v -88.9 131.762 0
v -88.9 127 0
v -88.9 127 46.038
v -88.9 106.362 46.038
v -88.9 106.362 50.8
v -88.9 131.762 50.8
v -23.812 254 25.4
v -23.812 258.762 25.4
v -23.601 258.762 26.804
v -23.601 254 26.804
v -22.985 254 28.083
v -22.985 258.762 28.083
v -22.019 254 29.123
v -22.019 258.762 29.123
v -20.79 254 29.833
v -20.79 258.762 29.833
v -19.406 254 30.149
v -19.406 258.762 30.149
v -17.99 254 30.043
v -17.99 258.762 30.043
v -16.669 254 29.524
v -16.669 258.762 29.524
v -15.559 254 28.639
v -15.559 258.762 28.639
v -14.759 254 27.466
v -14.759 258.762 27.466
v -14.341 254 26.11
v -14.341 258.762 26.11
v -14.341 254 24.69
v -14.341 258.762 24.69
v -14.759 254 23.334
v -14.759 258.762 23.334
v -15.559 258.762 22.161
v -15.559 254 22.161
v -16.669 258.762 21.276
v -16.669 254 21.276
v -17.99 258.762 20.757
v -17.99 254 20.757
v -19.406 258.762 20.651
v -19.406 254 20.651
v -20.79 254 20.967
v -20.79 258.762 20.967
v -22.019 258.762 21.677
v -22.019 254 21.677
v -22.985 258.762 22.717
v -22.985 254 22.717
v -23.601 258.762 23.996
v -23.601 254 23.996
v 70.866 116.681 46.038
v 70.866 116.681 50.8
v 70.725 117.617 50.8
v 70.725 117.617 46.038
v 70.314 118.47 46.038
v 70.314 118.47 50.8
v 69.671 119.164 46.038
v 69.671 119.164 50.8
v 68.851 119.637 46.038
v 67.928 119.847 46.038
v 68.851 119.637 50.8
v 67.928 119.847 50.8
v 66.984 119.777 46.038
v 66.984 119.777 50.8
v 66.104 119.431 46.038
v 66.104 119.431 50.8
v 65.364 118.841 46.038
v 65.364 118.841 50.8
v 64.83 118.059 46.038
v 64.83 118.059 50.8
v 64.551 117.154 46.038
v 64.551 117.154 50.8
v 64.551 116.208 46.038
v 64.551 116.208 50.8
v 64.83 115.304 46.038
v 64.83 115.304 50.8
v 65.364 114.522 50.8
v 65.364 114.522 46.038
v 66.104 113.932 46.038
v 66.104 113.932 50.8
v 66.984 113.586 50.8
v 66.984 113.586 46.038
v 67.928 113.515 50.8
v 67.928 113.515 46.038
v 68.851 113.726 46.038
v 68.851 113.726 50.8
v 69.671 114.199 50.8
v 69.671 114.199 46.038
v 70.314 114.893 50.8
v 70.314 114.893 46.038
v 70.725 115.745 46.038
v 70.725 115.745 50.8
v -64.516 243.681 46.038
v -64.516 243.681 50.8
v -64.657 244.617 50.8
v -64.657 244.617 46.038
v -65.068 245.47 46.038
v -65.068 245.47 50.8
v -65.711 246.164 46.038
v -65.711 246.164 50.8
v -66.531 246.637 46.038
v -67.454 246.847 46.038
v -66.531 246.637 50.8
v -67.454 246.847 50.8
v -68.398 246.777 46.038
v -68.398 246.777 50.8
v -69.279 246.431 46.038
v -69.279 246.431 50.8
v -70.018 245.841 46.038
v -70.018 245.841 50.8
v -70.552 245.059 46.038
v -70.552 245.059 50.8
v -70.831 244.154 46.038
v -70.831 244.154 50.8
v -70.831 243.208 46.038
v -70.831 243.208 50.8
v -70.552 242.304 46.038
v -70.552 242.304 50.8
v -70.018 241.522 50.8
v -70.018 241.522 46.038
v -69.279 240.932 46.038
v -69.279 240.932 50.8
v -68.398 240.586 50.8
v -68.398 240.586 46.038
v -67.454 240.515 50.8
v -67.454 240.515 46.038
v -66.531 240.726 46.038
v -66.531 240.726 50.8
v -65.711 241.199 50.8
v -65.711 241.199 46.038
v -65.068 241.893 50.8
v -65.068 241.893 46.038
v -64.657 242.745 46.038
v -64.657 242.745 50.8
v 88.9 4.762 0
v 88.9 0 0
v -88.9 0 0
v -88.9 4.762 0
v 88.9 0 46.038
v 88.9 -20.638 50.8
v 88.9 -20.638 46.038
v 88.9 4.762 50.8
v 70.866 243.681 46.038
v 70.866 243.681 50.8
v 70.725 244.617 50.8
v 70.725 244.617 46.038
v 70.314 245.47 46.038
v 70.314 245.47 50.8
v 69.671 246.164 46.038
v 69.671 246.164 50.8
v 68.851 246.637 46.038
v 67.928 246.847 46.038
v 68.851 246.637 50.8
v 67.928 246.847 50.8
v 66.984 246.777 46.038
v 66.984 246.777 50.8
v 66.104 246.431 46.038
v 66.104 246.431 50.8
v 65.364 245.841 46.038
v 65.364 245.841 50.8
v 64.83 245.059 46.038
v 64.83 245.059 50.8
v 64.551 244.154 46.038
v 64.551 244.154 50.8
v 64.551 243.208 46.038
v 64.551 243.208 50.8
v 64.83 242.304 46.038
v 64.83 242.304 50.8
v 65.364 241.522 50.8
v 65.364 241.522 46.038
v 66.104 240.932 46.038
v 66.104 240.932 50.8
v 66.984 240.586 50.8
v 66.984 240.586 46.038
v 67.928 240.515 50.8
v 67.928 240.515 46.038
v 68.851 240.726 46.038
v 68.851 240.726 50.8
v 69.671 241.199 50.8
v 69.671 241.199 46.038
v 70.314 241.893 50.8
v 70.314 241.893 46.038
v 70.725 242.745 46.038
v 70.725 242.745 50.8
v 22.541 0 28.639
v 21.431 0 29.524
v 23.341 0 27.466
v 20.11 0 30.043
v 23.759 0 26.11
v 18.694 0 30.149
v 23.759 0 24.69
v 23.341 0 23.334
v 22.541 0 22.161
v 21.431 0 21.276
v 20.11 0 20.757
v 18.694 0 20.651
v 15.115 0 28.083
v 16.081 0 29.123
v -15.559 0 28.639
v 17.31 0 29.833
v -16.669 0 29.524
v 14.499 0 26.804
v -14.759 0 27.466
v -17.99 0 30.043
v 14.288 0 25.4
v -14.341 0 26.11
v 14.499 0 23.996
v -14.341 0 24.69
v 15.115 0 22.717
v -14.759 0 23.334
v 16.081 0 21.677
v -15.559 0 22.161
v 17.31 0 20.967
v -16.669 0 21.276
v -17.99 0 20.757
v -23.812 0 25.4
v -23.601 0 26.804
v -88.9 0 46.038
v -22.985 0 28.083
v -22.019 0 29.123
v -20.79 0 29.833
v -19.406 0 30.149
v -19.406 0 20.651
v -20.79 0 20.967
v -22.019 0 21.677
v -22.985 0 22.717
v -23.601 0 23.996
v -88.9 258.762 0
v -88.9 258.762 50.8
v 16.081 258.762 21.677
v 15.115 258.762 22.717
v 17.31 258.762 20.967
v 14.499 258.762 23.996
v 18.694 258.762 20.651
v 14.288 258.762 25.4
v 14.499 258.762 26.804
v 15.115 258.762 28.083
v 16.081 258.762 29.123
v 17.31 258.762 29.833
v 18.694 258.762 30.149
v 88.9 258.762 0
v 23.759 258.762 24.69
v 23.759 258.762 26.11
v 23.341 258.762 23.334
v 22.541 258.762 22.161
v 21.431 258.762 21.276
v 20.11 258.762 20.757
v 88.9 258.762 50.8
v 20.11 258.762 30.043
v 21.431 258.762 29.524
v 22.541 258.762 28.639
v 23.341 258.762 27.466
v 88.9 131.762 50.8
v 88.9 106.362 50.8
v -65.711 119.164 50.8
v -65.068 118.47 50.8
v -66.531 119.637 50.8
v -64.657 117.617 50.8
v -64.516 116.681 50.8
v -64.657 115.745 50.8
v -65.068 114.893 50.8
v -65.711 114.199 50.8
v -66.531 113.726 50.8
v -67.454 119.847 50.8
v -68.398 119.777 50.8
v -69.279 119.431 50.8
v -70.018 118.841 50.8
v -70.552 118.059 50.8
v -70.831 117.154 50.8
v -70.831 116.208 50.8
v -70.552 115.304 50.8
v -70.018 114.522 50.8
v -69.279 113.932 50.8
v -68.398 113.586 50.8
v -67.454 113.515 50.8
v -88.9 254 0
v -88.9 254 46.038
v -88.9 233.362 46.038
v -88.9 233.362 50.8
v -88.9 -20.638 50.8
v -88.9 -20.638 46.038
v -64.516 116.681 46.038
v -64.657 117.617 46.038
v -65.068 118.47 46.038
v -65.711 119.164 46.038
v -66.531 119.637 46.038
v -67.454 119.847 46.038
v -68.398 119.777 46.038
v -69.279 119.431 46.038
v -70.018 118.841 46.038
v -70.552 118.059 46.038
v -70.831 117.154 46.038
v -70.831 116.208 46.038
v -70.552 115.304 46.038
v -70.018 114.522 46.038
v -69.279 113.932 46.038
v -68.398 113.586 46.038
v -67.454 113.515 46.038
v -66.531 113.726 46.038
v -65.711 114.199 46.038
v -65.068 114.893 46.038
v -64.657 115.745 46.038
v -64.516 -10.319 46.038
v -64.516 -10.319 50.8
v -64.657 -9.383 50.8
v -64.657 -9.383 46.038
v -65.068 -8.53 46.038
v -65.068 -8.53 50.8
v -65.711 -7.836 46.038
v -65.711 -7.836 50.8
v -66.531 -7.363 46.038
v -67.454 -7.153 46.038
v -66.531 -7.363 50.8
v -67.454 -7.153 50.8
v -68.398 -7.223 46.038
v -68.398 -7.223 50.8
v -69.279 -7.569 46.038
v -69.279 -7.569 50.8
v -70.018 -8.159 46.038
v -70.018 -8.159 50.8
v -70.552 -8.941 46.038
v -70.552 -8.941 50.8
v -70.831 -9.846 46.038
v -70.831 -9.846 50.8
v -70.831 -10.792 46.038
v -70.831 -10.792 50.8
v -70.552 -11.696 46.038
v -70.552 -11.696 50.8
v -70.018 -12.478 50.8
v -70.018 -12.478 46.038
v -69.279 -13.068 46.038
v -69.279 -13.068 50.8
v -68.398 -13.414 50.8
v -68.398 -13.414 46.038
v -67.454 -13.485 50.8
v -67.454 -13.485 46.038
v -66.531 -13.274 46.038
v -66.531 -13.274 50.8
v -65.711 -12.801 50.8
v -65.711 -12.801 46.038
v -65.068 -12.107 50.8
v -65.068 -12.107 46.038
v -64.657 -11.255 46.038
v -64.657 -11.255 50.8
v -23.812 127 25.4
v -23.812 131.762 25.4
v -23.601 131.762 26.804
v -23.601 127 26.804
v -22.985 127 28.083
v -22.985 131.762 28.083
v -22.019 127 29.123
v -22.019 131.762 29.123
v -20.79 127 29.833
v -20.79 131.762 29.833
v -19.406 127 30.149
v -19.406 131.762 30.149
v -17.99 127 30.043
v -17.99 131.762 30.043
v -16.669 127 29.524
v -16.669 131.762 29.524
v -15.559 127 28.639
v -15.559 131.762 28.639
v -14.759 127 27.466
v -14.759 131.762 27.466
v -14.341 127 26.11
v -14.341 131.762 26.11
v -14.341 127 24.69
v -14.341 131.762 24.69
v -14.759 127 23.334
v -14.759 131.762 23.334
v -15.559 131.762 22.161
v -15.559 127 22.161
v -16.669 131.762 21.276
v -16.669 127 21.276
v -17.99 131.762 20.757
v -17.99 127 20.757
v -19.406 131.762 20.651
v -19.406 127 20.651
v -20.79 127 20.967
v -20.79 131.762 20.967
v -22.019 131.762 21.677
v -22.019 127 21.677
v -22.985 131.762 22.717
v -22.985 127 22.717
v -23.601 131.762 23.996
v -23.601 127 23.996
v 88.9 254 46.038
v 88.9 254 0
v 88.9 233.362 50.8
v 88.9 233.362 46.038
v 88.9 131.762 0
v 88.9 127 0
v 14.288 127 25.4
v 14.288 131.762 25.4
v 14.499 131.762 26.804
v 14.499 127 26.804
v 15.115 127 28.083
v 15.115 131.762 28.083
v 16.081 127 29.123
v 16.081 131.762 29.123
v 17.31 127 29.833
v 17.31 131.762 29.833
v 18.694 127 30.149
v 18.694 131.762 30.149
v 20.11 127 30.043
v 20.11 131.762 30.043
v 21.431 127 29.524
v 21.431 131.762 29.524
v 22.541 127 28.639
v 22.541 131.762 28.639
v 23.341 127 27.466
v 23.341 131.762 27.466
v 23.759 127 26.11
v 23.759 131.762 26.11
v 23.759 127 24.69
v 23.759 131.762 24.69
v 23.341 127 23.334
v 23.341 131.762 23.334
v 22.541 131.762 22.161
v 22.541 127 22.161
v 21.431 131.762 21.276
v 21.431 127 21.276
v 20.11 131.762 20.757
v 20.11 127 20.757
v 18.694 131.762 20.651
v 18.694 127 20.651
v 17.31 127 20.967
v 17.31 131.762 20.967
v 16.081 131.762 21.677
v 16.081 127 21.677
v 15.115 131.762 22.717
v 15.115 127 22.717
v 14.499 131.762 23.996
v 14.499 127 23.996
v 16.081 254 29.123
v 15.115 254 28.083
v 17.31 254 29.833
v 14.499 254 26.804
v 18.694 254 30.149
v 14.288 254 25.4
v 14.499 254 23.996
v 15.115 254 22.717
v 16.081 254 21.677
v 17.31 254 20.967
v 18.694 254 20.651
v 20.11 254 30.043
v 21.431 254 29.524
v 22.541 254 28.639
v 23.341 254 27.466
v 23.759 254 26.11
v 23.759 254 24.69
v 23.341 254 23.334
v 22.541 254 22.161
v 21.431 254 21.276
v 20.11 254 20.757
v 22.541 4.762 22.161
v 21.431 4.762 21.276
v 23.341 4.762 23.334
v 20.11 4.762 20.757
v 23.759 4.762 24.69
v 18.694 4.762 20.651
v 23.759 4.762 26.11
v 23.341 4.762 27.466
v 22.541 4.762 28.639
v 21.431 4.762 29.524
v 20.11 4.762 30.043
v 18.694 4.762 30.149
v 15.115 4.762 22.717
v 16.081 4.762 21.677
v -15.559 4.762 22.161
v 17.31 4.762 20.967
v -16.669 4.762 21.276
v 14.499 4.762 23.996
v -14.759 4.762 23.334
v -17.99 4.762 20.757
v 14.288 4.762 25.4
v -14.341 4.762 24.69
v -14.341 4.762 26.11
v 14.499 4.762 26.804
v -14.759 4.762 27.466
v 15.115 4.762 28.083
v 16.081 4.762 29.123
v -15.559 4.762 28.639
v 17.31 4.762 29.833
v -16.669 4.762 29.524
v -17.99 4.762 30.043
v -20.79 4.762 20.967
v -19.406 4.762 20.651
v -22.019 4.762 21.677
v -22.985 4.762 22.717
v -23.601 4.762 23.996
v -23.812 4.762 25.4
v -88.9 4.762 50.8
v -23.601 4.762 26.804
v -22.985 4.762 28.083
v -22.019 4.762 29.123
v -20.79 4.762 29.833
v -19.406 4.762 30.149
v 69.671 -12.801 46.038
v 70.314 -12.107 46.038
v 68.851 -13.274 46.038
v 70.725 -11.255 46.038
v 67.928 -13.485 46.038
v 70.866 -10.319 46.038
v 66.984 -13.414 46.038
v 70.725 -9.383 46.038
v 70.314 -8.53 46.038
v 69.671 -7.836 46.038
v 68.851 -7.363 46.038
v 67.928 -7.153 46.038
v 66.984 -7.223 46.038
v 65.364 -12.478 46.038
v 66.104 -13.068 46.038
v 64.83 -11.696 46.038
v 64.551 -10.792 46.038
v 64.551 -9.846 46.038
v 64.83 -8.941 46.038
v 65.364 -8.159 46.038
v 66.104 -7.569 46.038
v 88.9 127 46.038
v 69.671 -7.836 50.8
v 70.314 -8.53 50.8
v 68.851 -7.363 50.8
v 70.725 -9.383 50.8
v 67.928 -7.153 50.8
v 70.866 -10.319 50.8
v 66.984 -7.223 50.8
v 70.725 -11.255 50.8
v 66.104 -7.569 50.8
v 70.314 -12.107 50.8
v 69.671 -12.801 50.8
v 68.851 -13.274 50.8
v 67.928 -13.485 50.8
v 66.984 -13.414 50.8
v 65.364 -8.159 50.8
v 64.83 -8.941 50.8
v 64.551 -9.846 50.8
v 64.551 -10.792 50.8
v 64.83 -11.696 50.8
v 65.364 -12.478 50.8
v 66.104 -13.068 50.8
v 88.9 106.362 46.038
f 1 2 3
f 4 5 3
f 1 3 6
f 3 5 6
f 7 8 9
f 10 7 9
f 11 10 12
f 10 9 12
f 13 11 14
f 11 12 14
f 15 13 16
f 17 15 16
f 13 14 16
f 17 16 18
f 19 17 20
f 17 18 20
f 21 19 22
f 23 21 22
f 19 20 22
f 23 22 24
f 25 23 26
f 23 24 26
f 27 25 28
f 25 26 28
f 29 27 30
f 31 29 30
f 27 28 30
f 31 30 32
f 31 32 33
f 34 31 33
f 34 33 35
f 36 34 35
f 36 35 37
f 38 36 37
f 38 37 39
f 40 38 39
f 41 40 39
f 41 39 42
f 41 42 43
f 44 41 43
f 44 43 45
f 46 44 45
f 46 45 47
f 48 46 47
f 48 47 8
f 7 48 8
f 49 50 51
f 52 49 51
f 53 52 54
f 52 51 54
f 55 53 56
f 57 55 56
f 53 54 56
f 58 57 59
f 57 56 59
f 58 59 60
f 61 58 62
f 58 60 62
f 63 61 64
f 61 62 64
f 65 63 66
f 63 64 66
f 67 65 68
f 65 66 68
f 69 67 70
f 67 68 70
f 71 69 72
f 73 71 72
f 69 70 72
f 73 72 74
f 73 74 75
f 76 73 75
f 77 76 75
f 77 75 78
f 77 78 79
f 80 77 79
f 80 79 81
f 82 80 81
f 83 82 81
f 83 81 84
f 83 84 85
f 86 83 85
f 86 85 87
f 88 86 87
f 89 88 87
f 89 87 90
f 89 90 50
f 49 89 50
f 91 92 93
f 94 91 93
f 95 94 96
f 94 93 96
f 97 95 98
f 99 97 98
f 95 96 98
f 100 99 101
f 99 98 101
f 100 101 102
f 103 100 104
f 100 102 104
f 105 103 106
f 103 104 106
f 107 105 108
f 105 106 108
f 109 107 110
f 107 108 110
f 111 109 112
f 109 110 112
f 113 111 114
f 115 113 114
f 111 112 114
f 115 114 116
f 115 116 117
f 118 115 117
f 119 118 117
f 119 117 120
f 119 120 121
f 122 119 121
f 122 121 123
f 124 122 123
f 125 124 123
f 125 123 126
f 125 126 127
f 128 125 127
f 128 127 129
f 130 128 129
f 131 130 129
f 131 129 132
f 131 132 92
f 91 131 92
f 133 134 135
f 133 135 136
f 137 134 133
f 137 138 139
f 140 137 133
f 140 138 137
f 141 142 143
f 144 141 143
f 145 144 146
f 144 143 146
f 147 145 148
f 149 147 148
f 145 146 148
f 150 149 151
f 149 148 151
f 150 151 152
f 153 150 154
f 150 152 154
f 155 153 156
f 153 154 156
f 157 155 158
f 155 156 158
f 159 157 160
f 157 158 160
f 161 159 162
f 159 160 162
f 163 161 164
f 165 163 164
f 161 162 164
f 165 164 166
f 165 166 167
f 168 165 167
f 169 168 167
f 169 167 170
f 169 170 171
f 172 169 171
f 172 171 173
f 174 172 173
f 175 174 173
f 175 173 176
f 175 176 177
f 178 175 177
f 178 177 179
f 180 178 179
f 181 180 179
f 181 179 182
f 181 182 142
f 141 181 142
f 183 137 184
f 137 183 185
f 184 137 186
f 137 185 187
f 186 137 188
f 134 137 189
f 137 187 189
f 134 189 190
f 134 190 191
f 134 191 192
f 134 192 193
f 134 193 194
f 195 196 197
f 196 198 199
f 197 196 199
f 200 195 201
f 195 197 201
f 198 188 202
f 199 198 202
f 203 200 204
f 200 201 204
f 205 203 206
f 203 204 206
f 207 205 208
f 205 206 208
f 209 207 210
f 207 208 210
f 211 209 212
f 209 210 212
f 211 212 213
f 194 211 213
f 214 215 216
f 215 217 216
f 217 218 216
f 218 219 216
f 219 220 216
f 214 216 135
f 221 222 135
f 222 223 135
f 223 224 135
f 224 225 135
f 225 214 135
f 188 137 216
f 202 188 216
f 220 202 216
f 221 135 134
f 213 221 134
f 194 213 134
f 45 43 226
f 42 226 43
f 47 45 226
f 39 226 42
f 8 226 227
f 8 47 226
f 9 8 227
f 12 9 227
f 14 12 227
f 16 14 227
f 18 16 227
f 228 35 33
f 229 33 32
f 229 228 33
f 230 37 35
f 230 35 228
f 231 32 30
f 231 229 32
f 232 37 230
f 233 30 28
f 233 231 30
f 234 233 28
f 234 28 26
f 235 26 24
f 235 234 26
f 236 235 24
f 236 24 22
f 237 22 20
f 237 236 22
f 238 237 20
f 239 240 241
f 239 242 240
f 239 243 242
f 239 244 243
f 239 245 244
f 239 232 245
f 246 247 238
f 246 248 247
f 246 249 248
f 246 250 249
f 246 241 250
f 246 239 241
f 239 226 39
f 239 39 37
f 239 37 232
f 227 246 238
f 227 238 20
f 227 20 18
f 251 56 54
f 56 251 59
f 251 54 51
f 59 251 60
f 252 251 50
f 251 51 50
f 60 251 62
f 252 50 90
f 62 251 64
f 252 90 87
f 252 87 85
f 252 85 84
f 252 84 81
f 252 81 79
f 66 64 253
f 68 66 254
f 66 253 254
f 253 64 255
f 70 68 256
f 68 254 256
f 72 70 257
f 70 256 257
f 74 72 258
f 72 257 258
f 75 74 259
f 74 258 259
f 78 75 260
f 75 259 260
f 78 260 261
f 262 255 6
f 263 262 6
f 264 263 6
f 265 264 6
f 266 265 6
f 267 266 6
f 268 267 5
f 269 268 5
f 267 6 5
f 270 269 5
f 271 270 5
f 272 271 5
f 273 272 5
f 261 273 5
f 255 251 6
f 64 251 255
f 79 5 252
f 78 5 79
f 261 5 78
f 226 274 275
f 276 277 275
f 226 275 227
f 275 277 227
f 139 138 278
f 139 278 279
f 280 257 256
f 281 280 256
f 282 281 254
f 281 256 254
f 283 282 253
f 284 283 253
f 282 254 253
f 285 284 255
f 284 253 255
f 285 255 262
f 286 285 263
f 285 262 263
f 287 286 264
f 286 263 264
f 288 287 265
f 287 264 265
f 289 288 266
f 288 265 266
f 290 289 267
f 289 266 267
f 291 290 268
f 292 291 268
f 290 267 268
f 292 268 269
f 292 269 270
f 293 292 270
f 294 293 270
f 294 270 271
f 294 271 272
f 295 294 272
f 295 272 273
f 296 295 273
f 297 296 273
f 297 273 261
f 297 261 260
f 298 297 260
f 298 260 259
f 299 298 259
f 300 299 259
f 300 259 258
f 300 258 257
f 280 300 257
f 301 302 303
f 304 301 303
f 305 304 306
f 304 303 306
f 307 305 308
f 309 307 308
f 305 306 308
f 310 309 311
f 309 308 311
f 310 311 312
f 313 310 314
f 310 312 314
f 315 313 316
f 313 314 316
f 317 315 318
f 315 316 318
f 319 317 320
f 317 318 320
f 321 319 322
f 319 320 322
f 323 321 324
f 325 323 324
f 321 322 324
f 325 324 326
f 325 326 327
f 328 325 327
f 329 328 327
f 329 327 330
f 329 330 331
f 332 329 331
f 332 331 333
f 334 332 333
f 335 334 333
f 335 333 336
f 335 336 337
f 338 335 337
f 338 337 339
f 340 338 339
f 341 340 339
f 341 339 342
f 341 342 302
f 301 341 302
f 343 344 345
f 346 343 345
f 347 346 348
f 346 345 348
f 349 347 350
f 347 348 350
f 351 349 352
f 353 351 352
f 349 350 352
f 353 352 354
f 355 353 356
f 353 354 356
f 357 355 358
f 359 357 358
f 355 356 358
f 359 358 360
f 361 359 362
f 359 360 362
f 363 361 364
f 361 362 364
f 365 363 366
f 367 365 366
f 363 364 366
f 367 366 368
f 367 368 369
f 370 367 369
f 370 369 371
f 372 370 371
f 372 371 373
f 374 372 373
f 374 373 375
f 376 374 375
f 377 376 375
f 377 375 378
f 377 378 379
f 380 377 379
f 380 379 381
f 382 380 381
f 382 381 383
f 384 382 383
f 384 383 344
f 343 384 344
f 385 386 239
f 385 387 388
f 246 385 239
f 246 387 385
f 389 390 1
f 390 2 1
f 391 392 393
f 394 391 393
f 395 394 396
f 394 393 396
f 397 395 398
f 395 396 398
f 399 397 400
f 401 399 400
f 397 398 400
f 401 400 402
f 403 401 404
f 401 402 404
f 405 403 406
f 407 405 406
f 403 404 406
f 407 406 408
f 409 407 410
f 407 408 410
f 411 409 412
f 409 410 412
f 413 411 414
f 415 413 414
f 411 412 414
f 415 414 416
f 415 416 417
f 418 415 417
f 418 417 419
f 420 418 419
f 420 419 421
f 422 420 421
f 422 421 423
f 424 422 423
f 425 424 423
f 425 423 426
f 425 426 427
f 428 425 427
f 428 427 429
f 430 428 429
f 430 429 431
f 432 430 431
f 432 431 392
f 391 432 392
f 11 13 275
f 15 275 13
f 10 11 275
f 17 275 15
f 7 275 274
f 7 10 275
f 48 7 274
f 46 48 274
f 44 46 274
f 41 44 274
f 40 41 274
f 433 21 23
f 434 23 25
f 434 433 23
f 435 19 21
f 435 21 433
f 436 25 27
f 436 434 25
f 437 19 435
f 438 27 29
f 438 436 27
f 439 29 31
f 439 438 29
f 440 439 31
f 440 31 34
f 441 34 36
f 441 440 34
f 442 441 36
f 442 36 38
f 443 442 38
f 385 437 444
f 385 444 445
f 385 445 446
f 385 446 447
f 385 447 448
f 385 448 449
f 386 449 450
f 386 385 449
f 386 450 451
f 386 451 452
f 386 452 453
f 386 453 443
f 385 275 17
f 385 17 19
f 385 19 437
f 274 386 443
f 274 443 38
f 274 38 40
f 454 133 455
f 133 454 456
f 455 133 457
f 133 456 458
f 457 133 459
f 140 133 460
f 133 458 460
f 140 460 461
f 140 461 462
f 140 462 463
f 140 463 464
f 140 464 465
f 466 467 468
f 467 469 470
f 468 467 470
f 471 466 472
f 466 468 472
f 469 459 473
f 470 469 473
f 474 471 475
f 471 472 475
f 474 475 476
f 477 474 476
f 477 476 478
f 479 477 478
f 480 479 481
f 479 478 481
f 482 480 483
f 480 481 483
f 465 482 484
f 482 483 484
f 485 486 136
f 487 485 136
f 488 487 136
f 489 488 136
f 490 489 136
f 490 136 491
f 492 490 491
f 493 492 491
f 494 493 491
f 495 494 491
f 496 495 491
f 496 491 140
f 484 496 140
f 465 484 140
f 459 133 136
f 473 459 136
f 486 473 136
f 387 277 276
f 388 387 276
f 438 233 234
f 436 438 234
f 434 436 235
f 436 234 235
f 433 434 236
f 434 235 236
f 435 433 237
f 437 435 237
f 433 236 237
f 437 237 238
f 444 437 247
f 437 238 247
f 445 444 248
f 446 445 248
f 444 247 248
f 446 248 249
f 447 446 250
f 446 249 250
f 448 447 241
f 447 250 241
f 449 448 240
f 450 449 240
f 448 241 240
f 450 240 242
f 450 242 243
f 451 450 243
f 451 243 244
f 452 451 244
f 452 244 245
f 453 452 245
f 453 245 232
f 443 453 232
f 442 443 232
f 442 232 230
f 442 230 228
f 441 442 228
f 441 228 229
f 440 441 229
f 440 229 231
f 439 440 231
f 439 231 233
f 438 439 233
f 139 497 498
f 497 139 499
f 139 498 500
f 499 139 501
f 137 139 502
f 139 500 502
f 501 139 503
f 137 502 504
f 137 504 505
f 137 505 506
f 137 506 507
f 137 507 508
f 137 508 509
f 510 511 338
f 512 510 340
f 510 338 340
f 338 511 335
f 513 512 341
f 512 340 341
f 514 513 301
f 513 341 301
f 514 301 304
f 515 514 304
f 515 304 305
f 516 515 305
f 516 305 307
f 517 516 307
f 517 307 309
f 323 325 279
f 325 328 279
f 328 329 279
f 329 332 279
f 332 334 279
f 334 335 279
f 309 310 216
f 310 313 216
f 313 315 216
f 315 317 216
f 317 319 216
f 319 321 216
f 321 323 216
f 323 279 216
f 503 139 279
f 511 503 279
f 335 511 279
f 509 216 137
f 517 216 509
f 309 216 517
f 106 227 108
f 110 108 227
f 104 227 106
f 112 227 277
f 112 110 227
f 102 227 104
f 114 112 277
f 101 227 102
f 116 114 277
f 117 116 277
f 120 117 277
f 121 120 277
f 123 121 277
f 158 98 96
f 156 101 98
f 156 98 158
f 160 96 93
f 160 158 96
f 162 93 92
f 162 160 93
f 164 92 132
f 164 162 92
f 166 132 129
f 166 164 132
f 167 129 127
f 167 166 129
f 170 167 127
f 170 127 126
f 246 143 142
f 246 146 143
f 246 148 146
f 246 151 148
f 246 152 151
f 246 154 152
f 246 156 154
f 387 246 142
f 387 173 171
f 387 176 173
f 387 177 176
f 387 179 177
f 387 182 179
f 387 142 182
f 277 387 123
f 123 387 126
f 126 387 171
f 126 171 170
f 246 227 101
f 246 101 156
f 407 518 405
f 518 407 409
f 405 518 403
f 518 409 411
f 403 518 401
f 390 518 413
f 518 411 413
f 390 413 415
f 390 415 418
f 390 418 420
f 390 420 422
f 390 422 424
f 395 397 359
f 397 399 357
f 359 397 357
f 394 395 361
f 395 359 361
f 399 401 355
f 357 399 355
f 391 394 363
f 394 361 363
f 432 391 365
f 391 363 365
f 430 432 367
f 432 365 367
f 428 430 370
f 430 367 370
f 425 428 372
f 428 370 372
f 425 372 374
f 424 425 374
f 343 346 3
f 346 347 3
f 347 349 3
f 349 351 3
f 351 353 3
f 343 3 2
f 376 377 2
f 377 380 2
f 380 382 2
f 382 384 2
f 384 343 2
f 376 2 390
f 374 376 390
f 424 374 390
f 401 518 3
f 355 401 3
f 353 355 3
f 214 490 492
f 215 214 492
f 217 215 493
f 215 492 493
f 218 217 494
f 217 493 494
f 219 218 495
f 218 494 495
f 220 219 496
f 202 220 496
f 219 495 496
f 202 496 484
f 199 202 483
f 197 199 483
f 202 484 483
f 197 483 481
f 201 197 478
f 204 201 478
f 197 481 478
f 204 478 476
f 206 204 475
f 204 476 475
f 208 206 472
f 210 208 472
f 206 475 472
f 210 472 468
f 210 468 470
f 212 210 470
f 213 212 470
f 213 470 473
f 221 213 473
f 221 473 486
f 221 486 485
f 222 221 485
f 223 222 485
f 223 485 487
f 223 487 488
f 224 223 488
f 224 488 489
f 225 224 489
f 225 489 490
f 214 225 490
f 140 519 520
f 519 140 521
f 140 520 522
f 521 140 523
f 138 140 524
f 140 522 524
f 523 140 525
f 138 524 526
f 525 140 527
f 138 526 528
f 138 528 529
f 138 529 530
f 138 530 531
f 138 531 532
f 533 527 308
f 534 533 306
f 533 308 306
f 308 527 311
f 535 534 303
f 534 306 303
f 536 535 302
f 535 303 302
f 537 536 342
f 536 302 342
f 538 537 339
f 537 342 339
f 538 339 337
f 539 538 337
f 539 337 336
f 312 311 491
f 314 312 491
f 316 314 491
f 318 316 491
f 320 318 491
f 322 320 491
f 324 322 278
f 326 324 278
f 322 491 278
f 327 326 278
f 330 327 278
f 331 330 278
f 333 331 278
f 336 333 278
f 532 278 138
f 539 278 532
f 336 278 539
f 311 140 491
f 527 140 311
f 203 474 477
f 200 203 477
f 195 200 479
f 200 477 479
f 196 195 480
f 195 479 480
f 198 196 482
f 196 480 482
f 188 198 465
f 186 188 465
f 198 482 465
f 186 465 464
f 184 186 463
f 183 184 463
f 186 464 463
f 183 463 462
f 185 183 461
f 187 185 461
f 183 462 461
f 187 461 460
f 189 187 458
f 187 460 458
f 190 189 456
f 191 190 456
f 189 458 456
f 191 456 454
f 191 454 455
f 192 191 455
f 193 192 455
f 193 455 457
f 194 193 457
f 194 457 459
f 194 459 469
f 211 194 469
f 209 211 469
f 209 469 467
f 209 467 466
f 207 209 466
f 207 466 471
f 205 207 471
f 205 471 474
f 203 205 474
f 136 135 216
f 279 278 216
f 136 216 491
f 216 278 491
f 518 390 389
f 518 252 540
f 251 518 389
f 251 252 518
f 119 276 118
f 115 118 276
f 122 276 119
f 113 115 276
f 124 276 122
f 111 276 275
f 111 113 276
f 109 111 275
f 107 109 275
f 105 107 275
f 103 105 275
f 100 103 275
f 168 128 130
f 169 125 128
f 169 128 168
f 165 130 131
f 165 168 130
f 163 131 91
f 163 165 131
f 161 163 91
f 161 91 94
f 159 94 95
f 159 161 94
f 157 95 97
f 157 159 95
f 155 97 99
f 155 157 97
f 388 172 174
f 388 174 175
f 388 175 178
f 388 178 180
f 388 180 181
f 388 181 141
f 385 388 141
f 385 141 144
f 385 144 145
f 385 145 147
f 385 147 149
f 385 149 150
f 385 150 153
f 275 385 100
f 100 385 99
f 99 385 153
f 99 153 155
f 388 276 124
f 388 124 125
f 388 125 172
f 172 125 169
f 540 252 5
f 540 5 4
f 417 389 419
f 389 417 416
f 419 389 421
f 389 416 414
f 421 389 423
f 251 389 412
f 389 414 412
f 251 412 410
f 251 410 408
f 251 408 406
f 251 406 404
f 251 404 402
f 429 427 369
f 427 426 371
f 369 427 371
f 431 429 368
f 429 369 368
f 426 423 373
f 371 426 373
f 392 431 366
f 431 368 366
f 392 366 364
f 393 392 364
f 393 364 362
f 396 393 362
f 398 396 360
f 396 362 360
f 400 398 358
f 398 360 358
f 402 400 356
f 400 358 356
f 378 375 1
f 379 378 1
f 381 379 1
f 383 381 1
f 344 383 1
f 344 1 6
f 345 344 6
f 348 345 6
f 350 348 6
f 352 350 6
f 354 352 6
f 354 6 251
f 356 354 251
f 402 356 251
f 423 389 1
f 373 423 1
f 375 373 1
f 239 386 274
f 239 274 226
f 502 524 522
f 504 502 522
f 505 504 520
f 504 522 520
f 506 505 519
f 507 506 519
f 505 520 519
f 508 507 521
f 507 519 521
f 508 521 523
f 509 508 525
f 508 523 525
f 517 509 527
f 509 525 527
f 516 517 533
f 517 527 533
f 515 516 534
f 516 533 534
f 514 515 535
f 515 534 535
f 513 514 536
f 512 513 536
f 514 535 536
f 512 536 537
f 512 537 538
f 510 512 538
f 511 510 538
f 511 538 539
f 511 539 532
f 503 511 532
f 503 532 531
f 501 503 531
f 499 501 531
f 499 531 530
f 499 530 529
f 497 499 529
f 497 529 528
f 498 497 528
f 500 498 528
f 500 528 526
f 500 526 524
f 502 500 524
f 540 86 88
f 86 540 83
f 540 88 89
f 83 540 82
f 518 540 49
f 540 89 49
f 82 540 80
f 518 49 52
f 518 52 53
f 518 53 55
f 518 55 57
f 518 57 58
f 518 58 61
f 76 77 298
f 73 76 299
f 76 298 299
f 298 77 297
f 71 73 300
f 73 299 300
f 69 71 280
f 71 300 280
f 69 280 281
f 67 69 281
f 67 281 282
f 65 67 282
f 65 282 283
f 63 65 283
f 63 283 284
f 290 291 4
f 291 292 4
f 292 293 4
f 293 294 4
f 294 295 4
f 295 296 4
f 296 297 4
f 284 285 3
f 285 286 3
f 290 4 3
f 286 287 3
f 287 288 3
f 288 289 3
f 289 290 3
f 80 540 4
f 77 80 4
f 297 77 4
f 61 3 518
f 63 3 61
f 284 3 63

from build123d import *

# Parameters (mm, degrees)
F1_DEPTH = 88.9
F2_R     = 4.7625
F3_DEPTH = 279.401
F4_R     = 3.175
F5_DEPTH = 50.801


with BuildPart() as f1:
    # F0 (on Right) → F1 (new body, symmetric)
    with BuildSketch(Plane.YZ):
        Polygon((0, 46.0375), (0, 0), (4.7625, 0), (4.7625, 50.8), (-20.6375, 50.8), (-20.6375, 46.0375), align=None)
        Polygon((106.3625, 46.0375), (127, 46.0375), (127, 0), (131.7625, 0), (131.7625, 50.8), (106.3625, 50.8), align=None)
        Polygon((233.3625, 46.0375), (254, 46.0375), (254, 0), (258.7625, 0), (258.7625, 50.8), (233.3625, 50.8), align=None)
    extrude(amount=F1_DEPTH, both=True)

    # F2 (on face) → F3 (cut, through all)
    with BuildSketch(Plane(origin=(0, 258.7625, 0), x_dir=(-1, 0, 0), z_dir=(0, 1, 0))):
        with Locations((-19.05, 25.4)):
            Circle(F2_R)
        with Locations((19.05, 25.4)):
            Circle(F2_R)
    extrude(amount=-F3_DEPTH, mode=Mode.SUBTRACT)

    # F4 (on face) → F5 (cut, through all)
    with BuildSketch(Plane.XY.offset(50.8)):
        with Locations((-67.691, 243.68125)):
            Circle(F4_R)
        with Locations((-67.691, 116.68125)):
            Circle(F4_R)
        with Locations((-67.691, -10.31875)):
            Circle(F4_R)
        with Locations((67.691, 243.68125)):
            Circle(F4_R)
        with Locations((67.691, 116.68125)):
            Circle(F4_R)
        with Locations((67.691, -10.31875)):
            Circle(F4_R)
    extrude(amount=-F5_DEPTH, mode=Mode.SUBTRACT)


solid = f1.part
